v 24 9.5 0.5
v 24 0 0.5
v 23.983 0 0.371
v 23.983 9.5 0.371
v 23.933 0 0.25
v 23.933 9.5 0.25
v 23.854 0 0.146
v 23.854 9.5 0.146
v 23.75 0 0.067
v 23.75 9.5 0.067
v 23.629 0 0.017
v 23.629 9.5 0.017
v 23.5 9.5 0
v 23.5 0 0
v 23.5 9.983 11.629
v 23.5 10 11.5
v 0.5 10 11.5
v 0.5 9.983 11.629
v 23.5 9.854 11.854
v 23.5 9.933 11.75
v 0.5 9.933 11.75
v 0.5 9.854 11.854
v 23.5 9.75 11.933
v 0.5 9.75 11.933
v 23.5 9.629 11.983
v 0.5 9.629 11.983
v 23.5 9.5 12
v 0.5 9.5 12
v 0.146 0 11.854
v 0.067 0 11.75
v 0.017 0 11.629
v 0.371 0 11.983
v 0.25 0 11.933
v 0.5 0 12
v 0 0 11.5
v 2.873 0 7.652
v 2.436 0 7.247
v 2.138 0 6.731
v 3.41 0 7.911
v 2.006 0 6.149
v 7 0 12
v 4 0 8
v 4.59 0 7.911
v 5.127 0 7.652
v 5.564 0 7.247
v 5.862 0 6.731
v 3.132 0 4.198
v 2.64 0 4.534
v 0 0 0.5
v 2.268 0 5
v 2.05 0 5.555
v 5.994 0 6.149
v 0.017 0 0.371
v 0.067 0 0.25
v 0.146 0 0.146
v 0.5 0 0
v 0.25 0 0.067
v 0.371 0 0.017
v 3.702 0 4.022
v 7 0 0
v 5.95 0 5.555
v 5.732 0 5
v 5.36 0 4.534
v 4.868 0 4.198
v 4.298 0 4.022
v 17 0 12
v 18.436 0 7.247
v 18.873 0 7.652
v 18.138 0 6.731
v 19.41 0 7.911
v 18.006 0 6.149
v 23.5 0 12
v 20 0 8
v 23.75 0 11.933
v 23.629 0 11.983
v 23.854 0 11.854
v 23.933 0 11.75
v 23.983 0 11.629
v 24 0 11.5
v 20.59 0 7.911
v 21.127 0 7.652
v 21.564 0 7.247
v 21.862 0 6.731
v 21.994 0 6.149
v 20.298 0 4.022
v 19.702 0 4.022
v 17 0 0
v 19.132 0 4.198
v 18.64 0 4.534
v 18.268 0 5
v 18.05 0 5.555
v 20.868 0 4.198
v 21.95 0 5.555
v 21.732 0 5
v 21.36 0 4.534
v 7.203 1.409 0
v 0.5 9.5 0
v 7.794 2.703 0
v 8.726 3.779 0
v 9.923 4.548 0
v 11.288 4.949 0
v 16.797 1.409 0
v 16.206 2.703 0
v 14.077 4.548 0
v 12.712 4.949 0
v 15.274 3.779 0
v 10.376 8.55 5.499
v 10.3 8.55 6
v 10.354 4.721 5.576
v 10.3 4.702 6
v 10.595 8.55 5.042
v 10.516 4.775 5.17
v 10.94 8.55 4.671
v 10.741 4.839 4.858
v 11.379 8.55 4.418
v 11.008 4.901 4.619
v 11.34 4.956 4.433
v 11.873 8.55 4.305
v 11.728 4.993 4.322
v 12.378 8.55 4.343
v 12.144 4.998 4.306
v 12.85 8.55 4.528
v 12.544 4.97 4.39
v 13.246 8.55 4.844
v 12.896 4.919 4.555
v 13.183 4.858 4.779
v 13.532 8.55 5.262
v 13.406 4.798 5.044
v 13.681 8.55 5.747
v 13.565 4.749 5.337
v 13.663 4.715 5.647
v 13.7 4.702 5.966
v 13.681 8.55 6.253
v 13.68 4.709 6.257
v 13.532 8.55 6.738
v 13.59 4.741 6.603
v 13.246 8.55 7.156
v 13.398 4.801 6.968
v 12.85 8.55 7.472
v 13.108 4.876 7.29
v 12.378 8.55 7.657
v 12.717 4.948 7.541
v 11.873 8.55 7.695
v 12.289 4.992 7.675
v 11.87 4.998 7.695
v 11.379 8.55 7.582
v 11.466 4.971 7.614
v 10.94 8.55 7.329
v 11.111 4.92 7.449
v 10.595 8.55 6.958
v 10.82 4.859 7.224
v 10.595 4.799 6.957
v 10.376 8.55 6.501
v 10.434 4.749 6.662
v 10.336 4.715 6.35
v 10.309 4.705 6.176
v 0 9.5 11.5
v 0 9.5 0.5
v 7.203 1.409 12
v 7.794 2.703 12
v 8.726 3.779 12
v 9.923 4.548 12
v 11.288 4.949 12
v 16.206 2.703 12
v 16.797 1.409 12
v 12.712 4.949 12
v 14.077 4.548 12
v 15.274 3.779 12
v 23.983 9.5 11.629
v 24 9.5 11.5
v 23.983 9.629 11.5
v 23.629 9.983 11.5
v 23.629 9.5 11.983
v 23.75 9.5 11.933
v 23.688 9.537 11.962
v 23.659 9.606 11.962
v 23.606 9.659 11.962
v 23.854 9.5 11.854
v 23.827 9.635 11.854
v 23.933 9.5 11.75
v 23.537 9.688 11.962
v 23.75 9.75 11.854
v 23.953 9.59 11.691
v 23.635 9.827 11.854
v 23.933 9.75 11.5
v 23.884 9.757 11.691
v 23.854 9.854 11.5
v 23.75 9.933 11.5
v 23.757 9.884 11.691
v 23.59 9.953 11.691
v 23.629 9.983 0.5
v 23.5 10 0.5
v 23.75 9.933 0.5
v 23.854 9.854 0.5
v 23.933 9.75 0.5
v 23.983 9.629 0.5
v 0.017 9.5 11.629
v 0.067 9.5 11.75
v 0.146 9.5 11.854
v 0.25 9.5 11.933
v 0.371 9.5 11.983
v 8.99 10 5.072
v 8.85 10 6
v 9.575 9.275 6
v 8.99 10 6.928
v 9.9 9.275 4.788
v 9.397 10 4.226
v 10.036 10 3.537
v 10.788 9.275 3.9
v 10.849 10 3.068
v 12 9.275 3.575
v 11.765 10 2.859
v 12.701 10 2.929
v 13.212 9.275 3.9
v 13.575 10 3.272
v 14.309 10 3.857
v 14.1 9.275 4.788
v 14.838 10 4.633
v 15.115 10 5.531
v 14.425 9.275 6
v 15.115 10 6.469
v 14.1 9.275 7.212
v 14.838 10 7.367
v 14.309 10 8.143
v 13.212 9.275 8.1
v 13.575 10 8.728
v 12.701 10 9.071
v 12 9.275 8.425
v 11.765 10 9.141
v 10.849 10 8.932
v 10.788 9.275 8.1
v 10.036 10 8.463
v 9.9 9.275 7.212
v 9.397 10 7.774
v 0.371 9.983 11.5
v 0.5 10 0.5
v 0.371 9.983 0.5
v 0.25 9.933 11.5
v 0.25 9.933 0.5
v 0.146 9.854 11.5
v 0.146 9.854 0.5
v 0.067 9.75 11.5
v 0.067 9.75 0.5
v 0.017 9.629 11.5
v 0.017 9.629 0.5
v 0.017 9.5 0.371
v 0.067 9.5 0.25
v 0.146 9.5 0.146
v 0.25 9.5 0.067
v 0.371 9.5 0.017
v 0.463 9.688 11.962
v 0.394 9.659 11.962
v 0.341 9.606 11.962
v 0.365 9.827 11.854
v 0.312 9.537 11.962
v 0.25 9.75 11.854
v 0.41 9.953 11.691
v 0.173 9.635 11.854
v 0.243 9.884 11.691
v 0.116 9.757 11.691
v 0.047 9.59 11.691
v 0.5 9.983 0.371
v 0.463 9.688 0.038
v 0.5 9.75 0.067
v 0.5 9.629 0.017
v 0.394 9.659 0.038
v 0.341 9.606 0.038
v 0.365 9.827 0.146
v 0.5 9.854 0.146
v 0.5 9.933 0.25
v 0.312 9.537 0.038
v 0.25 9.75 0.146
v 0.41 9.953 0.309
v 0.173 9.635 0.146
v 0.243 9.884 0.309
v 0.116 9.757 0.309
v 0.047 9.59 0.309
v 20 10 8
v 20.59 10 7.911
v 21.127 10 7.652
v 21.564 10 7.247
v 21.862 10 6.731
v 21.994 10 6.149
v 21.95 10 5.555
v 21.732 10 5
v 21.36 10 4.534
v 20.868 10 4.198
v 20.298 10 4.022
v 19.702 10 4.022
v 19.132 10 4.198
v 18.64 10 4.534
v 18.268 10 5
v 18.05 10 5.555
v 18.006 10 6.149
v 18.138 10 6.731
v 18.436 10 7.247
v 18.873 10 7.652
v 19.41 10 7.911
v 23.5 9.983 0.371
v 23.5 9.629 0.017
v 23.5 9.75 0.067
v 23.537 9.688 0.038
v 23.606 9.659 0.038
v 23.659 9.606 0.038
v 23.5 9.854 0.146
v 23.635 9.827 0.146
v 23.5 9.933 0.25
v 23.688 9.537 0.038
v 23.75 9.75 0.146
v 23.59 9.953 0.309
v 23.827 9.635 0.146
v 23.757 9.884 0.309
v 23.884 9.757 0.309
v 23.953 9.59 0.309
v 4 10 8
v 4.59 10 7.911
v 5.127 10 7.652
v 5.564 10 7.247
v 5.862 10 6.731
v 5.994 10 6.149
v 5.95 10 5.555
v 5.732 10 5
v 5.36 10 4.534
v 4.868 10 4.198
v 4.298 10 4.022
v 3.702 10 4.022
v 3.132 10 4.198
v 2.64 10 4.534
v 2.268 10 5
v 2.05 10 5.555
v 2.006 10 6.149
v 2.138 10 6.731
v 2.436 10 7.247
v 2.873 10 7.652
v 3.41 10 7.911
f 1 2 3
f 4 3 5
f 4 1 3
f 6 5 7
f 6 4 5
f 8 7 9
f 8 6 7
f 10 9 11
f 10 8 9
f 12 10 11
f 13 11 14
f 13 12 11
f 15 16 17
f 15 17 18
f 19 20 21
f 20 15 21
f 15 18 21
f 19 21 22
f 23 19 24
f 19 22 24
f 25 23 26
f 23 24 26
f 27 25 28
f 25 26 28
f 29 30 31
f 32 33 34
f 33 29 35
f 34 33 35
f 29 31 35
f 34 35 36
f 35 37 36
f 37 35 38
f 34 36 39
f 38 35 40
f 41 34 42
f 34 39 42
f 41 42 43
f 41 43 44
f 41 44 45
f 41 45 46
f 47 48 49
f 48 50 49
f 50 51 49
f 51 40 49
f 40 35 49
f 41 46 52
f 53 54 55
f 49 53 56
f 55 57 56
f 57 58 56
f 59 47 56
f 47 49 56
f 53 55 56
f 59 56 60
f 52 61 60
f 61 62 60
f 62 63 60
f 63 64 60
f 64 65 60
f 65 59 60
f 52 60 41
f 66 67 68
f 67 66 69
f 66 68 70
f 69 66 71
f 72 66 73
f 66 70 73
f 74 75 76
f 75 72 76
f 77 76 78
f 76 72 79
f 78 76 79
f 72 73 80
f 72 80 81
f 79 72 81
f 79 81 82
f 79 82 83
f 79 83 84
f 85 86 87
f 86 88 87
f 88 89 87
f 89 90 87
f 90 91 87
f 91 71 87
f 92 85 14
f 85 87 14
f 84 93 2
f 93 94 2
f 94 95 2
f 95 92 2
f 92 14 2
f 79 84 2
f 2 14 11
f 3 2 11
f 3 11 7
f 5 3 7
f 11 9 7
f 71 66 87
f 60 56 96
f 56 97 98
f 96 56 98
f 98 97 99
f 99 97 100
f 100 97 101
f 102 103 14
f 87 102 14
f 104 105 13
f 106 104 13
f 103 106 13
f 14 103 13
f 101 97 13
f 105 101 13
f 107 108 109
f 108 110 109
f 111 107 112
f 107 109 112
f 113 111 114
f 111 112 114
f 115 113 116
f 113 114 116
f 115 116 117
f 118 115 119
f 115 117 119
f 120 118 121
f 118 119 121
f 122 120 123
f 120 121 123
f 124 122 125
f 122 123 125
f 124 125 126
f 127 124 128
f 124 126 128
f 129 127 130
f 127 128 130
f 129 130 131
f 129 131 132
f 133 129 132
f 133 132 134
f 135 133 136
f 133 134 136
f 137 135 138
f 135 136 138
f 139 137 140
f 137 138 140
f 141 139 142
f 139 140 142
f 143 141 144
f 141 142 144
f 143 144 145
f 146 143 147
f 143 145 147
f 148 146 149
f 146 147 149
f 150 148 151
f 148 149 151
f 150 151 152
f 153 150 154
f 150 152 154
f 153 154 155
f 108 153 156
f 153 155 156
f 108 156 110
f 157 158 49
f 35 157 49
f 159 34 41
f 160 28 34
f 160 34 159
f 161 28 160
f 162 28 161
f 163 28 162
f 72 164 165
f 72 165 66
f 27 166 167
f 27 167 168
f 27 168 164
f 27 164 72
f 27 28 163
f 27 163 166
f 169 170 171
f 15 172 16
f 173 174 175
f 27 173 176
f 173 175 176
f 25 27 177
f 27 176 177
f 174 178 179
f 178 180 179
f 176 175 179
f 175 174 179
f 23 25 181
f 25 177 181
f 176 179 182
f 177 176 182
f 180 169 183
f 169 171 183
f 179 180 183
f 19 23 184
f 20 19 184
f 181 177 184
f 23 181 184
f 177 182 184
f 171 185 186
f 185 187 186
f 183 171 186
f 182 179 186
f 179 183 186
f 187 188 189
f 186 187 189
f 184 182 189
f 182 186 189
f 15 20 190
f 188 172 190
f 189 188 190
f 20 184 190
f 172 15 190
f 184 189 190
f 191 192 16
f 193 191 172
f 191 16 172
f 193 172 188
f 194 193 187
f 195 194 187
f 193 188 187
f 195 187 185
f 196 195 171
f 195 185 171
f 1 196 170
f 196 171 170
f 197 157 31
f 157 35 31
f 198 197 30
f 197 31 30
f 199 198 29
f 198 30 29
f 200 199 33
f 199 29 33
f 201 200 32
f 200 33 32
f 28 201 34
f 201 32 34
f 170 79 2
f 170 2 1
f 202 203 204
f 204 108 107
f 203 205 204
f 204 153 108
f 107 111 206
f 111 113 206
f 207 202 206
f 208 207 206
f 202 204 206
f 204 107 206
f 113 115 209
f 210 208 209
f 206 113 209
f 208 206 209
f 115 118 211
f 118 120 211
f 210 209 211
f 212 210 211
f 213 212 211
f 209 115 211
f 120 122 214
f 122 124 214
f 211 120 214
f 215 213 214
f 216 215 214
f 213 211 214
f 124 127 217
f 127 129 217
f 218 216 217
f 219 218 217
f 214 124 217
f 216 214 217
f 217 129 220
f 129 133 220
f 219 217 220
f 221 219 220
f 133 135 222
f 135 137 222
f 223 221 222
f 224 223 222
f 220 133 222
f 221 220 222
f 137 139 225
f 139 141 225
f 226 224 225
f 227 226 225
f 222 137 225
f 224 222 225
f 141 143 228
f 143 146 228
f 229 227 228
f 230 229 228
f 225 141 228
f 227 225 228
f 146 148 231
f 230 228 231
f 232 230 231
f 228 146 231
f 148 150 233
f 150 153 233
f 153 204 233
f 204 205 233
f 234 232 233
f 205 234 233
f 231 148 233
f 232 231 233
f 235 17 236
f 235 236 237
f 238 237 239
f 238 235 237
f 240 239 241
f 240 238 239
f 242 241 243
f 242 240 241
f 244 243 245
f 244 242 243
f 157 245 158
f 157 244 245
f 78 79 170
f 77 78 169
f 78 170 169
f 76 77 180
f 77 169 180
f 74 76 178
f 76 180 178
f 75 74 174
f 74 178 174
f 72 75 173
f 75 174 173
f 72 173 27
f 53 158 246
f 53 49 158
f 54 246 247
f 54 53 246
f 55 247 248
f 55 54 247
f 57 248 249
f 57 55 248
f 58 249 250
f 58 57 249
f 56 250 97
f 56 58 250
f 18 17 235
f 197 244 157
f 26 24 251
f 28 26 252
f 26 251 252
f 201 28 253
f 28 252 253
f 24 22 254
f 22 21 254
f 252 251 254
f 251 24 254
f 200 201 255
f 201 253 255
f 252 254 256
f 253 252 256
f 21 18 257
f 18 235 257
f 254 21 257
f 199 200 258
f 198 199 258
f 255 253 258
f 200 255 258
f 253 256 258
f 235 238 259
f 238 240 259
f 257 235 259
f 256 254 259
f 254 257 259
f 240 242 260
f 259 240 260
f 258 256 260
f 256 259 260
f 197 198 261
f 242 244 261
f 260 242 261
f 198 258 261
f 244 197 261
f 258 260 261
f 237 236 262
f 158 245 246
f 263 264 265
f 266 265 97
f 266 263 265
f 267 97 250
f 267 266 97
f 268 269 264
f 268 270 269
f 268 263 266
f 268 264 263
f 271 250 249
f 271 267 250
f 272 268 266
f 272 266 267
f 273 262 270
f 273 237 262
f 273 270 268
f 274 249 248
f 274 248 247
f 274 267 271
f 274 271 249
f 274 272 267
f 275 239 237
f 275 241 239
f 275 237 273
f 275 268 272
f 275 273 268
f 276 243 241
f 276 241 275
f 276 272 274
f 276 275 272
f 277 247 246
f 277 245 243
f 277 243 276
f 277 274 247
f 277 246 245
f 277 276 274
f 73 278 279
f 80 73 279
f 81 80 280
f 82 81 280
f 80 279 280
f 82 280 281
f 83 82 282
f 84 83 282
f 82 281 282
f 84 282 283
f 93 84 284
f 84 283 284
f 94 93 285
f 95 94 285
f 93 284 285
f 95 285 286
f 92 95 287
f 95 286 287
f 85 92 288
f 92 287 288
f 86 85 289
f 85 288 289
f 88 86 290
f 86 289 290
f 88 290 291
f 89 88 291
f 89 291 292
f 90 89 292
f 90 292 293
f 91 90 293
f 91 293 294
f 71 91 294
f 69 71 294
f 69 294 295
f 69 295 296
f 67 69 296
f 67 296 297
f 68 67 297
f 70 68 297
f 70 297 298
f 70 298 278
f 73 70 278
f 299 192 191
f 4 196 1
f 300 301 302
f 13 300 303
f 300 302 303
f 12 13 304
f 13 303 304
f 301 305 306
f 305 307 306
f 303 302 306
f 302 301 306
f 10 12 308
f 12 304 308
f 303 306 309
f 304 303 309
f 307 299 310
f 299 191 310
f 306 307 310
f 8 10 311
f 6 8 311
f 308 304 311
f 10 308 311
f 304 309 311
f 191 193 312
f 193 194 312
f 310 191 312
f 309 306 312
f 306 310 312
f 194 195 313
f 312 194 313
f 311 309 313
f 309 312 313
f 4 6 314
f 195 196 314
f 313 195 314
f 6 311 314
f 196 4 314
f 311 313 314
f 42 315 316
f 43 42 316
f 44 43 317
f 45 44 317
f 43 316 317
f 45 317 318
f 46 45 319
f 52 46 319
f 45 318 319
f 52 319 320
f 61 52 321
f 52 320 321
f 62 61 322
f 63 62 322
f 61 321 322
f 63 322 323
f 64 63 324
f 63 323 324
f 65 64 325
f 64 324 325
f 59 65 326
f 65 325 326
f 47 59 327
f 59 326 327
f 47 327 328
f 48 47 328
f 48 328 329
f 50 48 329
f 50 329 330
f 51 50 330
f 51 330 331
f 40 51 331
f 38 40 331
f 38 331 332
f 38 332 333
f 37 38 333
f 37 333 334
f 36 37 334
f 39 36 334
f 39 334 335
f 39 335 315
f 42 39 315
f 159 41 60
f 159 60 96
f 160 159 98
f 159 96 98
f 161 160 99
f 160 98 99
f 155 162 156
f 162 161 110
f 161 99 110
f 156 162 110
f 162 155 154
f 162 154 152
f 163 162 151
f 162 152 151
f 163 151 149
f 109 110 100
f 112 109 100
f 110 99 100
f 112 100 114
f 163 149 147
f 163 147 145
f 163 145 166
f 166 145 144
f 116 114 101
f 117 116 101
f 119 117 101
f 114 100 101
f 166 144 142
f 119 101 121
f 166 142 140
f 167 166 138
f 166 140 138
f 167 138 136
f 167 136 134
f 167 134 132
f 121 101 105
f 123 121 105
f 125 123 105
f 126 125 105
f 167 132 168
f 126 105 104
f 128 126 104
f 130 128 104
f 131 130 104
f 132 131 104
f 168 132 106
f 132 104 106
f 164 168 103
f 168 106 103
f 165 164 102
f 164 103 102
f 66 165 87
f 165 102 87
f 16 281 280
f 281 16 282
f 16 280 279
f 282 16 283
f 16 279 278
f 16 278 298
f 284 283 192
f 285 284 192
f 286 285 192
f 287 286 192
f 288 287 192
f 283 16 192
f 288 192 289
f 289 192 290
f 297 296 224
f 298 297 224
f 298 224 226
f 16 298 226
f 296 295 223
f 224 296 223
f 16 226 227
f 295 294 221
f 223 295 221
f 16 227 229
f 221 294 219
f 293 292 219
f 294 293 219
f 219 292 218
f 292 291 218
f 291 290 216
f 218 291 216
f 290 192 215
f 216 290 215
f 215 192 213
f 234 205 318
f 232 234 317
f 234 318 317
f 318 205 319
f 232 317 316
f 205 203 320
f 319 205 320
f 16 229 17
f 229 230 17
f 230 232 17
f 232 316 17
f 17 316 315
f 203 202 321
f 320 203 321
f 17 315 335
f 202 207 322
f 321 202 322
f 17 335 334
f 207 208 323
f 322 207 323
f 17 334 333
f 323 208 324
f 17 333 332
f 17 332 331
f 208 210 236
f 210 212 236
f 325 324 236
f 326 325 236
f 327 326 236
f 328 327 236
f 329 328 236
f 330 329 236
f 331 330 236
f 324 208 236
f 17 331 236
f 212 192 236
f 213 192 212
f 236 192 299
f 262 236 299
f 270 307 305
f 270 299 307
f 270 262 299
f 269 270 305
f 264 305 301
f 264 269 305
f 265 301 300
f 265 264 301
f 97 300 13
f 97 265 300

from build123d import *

# Parameters (mm, degrees)
BOSS_EXTRUDE1_DEPTH                             = 12
SKETCH2_R                                       = 2
CUT_EXTRUDE1_DEPTH                              = 29.635642127
CSK_FOR_M3_FLAT_HEAD_MACHINE_SCREW1_D           = 3.4
CSK_FOR_M3_FLAT_HEAD_MACHINE_SCREW1_CSINK_D     = 6.3
CSK_FOR_M3_FLAT_HEAD_MACHINE_SCREW1_CSINK_ANGLE = 90
FILLET1_R                                       = 0.5


with BuildPart() as part:
    # Sketch1 → Boss-Extrude1 (new body)
    with BuildSketch(Plane.XY):
        with BuildLine():
            Line((17, 0), (24, 0))
            Line((24, 0), (24, 10))
            Line((24, 10), (0, 10))
            Line((0, 10), (0, 0))
            Line((0, 0), (7, 0))
            ThreePointArc((7, 0), (12, 5), (17, 0))
        make_face()
    extrude(amount=BOSS_EXTRUDE1_DEPTH)

    # Sketch2 → Cut-Extrude1 (cut, through all)
    with BuildSketch(Plane(origin=(0, 10, 0), x_dir=(1, 0, 0), z_dir=(0, 1, 0))):
        with Locations(Location((4, -6, 0), (0, 0, 270))):
            Circle(SKETCH2_R)
        with Locations(Location((20, -6, 0), (0, 0, 270))):
            Circle(SKETCH2_R)
    extrude(amount=-CUT_EXTRUDE1_DEPTH, mode=Mode.SUBTRACT)

    # CSK for M3 Flat Head Machine Screw1 (through all)
    with Locations(Plane(origin=(0, 10, 0), x_dir=(1, 0, 0), z_dir=(0, 1, 0))):
        with Locations((12, -6)):
            CounterSinkHole(CSK_FOR_M3_FLAT_HEAD_MACHINE_SCREW1_D / 2, CSK_FOR_M3_FLAT_HEAD_MACHINE_SCREW1_CSINK_D / 2, counter_sink_angle=CSK_FOR_M3_FLAT_HEAD_MACHINE_SCREW1_CSINK_ANGLE)

    # Fillet1
    fillet1_edges = [part.edges().sort_by_distance(p)[0] for p in [
        (0, 10, 6),
        (24, 10, 6),
        (24, 5, 12),
        (12, 10, 12),
        (0, 5, 12),
        (12, 10, 0),
        (24, 5, 0),
        (0, 5, 0),
    ]]
    fillet(fillet1_edges, radius=FILLET1_R)


solid = part.part
